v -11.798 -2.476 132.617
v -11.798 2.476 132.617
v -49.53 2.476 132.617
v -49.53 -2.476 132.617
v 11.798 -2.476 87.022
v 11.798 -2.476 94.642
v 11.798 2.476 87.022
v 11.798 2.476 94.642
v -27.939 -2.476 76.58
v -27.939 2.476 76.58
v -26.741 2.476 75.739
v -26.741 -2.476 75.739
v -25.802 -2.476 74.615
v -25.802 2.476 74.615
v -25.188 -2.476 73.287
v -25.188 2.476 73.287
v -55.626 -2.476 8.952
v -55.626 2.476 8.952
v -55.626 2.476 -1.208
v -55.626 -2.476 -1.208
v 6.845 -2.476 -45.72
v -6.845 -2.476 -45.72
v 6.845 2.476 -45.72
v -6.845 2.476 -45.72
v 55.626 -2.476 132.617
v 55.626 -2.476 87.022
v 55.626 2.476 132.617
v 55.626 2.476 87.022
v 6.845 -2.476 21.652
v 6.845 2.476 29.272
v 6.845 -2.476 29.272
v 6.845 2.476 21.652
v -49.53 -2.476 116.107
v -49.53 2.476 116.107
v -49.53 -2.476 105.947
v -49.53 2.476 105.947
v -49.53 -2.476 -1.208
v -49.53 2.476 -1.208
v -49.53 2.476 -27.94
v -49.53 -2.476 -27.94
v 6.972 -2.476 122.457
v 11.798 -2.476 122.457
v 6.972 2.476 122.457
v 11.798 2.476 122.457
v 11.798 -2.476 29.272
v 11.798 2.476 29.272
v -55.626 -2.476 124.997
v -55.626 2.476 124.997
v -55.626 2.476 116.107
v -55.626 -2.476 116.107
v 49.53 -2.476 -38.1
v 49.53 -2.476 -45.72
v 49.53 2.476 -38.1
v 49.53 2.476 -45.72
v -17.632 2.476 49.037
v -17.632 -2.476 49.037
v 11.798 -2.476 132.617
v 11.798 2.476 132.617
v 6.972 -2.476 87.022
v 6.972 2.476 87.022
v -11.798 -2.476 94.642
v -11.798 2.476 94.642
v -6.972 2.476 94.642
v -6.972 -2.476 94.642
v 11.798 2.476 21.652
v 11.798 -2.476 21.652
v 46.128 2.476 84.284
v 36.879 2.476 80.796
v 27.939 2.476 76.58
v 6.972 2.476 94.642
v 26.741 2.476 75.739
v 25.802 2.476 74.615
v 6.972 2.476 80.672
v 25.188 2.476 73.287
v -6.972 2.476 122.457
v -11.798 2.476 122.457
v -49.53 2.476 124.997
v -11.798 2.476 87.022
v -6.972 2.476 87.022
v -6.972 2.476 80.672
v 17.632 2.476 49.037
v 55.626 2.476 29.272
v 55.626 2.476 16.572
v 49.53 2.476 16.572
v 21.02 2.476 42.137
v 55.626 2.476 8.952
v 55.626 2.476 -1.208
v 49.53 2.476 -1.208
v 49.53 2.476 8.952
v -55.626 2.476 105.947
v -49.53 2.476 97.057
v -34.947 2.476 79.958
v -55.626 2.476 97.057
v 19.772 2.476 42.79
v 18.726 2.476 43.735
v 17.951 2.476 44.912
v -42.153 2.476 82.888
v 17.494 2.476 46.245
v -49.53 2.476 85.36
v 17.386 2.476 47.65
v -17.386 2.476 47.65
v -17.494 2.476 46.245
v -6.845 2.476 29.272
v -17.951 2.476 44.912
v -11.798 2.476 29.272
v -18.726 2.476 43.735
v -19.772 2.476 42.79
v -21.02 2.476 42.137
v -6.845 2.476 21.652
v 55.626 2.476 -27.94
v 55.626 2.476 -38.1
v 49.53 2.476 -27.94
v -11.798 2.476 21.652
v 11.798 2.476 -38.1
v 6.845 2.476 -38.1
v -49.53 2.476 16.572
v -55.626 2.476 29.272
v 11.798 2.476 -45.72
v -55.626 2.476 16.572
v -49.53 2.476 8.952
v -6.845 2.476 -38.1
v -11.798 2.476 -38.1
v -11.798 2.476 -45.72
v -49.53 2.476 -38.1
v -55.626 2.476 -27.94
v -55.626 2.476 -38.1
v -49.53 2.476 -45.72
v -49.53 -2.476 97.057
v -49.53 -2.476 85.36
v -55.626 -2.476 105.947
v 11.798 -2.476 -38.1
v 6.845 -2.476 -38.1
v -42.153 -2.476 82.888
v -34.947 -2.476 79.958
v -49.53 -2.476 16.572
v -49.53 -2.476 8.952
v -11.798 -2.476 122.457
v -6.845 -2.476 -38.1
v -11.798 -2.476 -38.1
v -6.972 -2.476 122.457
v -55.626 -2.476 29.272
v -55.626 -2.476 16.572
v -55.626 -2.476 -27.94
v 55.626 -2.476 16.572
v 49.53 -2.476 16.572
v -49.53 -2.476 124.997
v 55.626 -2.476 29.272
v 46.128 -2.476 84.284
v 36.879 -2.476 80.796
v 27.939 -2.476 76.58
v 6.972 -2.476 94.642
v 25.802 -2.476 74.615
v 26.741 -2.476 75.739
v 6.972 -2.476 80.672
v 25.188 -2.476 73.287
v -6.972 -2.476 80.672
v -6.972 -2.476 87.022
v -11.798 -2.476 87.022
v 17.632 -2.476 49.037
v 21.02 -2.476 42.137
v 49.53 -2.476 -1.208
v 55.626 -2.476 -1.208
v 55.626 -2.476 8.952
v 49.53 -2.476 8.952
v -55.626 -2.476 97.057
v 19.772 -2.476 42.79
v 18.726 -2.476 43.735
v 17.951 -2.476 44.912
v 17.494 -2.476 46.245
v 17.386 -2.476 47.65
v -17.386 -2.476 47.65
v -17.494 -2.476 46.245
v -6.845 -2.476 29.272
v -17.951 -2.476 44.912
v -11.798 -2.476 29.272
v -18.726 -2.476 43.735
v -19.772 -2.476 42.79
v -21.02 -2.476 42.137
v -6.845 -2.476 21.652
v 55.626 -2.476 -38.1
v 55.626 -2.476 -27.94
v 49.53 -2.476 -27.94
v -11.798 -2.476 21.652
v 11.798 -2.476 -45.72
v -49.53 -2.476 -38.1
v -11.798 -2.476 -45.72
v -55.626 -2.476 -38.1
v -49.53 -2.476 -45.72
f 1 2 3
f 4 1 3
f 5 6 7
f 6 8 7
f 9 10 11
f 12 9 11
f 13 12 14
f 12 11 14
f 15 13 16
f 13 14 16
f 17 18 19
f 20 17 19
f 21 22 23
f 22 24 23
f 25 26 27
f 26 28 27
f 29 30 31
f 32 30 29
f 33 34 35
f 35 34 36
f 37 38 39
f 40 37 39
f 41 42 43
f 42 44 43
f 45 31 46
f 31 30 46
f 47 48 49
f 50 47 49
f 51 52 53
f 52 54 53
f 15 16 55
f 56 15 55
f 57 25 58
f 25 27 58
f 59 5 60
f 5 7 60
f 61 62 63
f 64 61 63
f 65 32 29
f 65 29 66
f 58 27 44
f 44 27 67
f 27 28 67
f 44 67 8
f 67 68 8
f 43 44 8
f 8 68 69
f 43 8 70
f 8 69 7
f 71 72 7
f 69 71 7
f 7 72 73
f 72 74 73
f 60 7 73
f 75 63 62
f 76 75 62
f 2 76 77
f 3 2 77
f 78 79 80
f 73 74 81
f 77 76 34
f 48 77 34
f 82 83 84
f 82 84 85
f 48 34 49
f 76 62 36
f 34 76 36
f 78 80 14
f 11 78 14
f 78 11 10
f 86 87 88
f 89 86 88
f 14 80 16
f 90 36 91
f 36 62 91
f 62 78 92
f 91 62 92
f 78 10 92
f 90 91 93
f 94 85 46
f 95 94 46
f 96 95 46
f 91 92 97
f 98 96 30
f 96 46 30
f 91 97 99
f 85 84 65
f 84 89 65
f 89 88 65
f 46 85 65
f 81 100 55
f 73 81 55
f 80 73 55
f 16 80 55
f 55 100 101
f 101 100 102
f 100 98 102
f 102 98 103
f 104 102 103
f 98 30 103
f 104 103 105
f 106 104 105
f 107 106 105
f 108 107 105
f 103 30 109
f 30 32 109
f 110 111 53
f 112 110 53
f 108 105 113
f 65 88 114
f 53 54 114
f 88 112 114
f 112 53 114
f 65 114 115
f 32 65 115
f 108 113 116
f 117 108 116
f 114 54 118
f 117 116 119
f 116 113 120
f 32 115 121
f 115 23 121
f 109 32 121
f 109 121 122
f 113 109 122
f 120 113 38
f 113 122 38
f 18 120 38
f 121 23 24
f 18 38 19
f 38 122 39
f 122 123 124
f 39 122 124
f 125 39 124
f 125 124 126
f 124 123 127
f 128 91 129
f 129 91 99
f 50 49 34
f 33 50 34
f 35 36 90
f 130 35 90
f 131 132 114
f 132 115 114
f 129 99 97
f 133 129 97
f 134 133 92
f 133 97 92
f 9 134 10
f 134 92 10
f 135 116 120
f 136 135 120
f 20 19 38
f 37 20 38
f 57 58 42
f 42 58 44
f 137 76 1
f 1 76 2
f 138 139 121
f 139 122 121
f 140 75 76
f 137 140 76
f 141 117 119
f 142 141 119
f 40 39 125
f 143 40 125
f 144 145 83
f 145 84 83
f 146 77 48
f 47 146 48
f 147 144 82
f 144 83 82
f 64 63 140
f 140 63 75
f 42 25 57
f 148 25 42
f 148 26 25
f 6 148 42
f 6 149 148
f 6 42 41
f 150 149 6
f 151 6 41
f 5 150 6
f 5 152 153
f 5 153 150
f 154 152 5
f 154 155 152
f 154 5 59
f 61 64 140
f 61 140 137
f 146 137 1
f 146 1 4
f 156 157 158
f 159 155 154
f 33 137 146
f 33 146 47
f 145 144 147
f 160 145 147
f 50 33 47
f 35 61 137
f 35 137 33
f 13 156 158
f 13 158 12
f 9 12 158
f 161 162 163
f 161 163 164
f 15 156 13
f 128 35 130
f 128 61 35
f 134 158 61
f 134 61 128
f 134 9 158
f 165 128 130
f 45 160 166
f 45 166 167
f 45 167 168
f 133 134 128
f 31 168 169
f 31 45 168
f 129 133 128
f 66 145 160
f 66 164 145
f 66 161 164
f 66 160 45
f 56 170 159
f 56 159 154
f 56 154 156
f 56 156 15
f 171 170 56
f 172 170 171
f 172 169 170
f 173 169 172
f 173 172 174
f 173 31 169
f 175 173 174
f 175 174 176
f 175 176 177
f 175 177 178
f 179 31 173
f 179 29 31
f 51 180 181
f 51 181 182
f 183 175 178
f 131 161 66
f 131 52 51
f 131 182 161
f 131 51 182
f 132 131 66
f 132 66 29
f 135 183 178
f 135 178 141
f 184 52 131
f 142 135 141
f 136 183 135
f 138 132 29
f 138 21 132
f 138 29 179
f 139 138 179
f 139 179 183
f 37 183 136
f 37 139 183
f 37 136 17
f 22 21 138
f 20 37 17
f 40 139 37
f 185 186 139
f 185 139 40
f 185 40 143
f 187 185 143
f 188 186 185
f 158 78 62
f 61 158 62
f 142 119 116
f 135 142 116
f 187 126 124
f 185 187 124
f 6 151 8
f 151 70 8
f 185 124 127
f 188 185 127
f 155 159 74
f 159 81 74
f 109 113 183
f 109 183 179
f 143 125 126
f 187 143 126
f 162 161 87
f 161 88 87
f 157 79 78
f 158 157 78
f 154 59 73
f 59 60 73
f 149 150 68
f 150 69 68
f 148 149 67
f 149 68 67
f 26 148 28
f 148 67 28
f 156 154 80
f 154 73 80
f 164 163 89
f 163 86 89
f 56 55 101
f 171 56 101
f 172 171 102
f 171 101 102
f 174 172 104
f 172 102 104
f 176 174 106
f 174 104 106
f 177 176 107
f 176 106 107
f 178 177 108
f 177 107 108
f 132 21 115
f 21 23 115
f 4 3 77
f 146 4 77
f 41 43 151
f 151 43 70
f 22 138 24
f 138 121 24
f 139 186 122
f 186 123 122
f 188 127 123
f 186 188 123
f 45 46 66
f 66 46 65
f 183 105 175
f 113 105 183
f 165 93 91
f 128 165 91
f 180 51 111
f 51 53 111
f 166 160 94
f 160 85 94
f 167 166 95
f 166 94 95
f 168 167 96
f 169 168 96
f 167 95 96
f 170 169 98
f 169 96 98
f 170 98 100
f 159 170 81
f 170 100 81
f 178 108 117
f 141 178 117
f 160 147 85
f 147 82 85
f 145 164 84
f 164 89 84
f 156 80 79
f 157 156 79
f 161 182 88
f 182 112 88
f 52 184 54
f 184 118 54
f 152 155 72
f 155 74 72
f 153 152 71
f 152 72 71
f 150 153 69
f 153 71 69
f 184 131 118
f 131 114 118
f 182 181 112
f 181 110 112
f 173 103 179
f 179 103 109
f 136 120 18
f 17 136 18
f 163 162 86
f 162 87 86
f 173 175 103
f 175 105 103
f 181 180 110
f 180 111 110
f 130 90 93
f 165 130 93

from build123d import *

# Parameters (mm, degrees)
SKETCH1_W           = 4.953
SKETCH1_H           = 7.62
BOSS_EXTRUDE1_DEPTH = 2.4765


with BuildPart() as part:
    # Sketch1 → Boss-Extrude1 (new, symmetric)
    with BuildSketch(Plane(origin=(0, 0, 0), x_dir=(1, 0, 0), z_dir=(0, 1, 0))):
        with BuildLine():
            Line((-49.53, 45.72), (-11.7983, 45.72))
            Line((-11.7983, 45.72), (-11.7983, 38.1))
            Line((-11.7983, 38.1), (-6.8453, 38.1))
            Line((-6.8453, 38.1), (-6.8453, 45.72))
            Line((-6.8453, 45.72), (6.8453, 45.72))
            Line((6.8453, 45.72), (6.8453, 38.1))
            Line((6.8453, 38.1), (11.7983, 38.1))
            Line((11.7983, 38.1), (11.7983, 45.72))
            Line((11.7983, 45.72), (49.53, 45.72))
            Line((49.53, 45.72), (49.53, 38.1))
            Line((49.53, 38.1), (55.626, 38.1))
            Line((55.626, 38.1), (55.626, 27.94))
            Line((55.626, 27.94), (49.53, 27.94))
            Line((49.53, 27.94), (49.53, 1.208143374))
            Line((49.53, 1.208143374), (55.626, 1.208143374))
            Line((55.626, 1.208143374), (55.626, -8.951856626))
            Line((55.626, -8.951856626), (49.53, -8.951856626))
            Line((49.53, -8.951856626), (49.53, -16.571856626))
            Line((49.53, -16.571856626), (55.626, -16.571856626))
            Line((55.626, -16.571856626), (55.626, -29.271856626))
            Line((55.626, -29.271856626), (21.019827136, -42.136821893))
            ThreePointArc((21.019827136, -42.136821893), (17.95098831, -44.911778638), (17.631953735, -49.036869377))
            Line((17.631953735, -49.036869377), (25.187729856, -73.287029113))
            ThreePointArc((25.187729856, -73.287029113), (26.234780075, -75.207903536), (27.939063878, -76.579577488))
            ThreePointArc((27.939063878, -76.579577488), (41.468907088, -82.632484358), (55.626, -87.022365809))
            Line((55.626, -87.022365809), (55.626, -132.617292876))
            Line((55.626, -132.617292876), (11.7983, -132.617292876))
            Line((11.7983, -132.617292876), (11.7983, -122.457292876))
            Line((11.7983, -122.457292876), (6.9723, -122.457292876))
            Line((6.9723, -122.457292876), (6.9723, -94.642365809))
            Line((6.9723, -94.642365809), (11.7983, -94.642365809))
            Line((11.7983, -94.642365809), (11.7983, -87.022365809))
            Line((11.7983, -87.022365809), (6.9723, -87.022365809))
            Line((6.9723, -87.022365809), (6.9723, -80.672365809))
            Line((6.9723, -80.672365809), (-6.9723, -80.672365809))
            Line((-6.9723, -80.672365809), (-6.9723, -87.022365809))
            Line((-6.9723, -87.022365809), (-11.7983, -87.022365809))
            Line((-11.7983, -87.022365809), (-11.7983, -94.642365809))
            Line((-11.7983, -94.642365809), (-6.9723, -94.642365809))
            Line((-6.9723, -94.642365809), (-6.9723, -122.457292876))
            Line((-6.9723, -122.457292876), (-11.7983, -122.457292876))
            Line((-11.7983, -122.457292876), (-11.7983, -132.617292876))
            Line((-11.7983, -132.617292876), (-49.53, -132.617292876))
            Line((-49.53, -132.617292876), (-49.53, -124.997292876))
            Line((-49.53, -124.997292876), (-55.626, -124.997292876))
            Line((-55.626, -124.997292876), (-55.626, -116.107292876))
            Line((-55.626, -116.107292876), (-49.53, -116.107292876))
            Line((-49.53, -116.107292876), (-49.53, -105.947292876))
            Line((-49.53, -105.947292876), (-55.626, -105.947292876))
            Line((-55.626, -105.947292876), (-55.626, -97.057292876))
            Line((-55.626, -97.057292876), (-49.53, -97.057292876))
            Line((-49.53, -97.057292876), (-49.53, -85.359826344))
            ThreePointArc((-49.53, -85.359826344), (-38.527111219, -81.479756652), (-27.939063878, -76.579577488))
            ThreePointArc((-27.939063878, -76.579577488), (-26.234780075, -75.207903536), (-25.187729856, -73.287029113))
            Line((-25.187729856, -73.287029113), (-17.631953735, -49.036869377))
            ThreePointArc((-17.631953735, -49.036869377), (-17.95098831, -44.911778638), (-21.019827136, -42.136821893))
            Line((-21.019827136, -42.136821893), (-55.626, -29.271856626))
            Line((-55.626, -29.271856626), (-55.626, -16.571856626))
            Line((-55.626, -16.571856626), (-49.53, -16.571856626))
            Line((-49.53, -16.571856626), (-49.53, -8.951856626))
            Line((-49.53, -8.951856626), (-55.626, -8.951856626))
            Line((-55.626, -8.951856626), (-55.626, 1.208143374))
            Line((-55.626, 1.208143374), (-49.53, 1.208143374))
            Line((-49.53, 1.208143374), (-49.53, 27.94))
            Line((-49.53, 27.94), (-55.626, 27.94))
            Line((-55.626, 27.94), (-55.626, 38.1))
            Line((-55.626, 38.1), (-49.53, 38.1))
            Line((-49.53, 38.1), (-49.53, 45.72))
        make_face()
        with Locations((9.3218, -25.461856626)):
            Rectangle(SKETCH1_W, SKETCH1_H, mode=Mode.SUBTRACT)
        with Locations((-9.3218, -25.461856626)):
            Rectangle(SKETCH1_W, SKETCH1_H, mode=Mode.SUBTRACT)
    extrude(amount=BOSS_EXTRUDE1_DEPTH, both=True)


solid = part.part
